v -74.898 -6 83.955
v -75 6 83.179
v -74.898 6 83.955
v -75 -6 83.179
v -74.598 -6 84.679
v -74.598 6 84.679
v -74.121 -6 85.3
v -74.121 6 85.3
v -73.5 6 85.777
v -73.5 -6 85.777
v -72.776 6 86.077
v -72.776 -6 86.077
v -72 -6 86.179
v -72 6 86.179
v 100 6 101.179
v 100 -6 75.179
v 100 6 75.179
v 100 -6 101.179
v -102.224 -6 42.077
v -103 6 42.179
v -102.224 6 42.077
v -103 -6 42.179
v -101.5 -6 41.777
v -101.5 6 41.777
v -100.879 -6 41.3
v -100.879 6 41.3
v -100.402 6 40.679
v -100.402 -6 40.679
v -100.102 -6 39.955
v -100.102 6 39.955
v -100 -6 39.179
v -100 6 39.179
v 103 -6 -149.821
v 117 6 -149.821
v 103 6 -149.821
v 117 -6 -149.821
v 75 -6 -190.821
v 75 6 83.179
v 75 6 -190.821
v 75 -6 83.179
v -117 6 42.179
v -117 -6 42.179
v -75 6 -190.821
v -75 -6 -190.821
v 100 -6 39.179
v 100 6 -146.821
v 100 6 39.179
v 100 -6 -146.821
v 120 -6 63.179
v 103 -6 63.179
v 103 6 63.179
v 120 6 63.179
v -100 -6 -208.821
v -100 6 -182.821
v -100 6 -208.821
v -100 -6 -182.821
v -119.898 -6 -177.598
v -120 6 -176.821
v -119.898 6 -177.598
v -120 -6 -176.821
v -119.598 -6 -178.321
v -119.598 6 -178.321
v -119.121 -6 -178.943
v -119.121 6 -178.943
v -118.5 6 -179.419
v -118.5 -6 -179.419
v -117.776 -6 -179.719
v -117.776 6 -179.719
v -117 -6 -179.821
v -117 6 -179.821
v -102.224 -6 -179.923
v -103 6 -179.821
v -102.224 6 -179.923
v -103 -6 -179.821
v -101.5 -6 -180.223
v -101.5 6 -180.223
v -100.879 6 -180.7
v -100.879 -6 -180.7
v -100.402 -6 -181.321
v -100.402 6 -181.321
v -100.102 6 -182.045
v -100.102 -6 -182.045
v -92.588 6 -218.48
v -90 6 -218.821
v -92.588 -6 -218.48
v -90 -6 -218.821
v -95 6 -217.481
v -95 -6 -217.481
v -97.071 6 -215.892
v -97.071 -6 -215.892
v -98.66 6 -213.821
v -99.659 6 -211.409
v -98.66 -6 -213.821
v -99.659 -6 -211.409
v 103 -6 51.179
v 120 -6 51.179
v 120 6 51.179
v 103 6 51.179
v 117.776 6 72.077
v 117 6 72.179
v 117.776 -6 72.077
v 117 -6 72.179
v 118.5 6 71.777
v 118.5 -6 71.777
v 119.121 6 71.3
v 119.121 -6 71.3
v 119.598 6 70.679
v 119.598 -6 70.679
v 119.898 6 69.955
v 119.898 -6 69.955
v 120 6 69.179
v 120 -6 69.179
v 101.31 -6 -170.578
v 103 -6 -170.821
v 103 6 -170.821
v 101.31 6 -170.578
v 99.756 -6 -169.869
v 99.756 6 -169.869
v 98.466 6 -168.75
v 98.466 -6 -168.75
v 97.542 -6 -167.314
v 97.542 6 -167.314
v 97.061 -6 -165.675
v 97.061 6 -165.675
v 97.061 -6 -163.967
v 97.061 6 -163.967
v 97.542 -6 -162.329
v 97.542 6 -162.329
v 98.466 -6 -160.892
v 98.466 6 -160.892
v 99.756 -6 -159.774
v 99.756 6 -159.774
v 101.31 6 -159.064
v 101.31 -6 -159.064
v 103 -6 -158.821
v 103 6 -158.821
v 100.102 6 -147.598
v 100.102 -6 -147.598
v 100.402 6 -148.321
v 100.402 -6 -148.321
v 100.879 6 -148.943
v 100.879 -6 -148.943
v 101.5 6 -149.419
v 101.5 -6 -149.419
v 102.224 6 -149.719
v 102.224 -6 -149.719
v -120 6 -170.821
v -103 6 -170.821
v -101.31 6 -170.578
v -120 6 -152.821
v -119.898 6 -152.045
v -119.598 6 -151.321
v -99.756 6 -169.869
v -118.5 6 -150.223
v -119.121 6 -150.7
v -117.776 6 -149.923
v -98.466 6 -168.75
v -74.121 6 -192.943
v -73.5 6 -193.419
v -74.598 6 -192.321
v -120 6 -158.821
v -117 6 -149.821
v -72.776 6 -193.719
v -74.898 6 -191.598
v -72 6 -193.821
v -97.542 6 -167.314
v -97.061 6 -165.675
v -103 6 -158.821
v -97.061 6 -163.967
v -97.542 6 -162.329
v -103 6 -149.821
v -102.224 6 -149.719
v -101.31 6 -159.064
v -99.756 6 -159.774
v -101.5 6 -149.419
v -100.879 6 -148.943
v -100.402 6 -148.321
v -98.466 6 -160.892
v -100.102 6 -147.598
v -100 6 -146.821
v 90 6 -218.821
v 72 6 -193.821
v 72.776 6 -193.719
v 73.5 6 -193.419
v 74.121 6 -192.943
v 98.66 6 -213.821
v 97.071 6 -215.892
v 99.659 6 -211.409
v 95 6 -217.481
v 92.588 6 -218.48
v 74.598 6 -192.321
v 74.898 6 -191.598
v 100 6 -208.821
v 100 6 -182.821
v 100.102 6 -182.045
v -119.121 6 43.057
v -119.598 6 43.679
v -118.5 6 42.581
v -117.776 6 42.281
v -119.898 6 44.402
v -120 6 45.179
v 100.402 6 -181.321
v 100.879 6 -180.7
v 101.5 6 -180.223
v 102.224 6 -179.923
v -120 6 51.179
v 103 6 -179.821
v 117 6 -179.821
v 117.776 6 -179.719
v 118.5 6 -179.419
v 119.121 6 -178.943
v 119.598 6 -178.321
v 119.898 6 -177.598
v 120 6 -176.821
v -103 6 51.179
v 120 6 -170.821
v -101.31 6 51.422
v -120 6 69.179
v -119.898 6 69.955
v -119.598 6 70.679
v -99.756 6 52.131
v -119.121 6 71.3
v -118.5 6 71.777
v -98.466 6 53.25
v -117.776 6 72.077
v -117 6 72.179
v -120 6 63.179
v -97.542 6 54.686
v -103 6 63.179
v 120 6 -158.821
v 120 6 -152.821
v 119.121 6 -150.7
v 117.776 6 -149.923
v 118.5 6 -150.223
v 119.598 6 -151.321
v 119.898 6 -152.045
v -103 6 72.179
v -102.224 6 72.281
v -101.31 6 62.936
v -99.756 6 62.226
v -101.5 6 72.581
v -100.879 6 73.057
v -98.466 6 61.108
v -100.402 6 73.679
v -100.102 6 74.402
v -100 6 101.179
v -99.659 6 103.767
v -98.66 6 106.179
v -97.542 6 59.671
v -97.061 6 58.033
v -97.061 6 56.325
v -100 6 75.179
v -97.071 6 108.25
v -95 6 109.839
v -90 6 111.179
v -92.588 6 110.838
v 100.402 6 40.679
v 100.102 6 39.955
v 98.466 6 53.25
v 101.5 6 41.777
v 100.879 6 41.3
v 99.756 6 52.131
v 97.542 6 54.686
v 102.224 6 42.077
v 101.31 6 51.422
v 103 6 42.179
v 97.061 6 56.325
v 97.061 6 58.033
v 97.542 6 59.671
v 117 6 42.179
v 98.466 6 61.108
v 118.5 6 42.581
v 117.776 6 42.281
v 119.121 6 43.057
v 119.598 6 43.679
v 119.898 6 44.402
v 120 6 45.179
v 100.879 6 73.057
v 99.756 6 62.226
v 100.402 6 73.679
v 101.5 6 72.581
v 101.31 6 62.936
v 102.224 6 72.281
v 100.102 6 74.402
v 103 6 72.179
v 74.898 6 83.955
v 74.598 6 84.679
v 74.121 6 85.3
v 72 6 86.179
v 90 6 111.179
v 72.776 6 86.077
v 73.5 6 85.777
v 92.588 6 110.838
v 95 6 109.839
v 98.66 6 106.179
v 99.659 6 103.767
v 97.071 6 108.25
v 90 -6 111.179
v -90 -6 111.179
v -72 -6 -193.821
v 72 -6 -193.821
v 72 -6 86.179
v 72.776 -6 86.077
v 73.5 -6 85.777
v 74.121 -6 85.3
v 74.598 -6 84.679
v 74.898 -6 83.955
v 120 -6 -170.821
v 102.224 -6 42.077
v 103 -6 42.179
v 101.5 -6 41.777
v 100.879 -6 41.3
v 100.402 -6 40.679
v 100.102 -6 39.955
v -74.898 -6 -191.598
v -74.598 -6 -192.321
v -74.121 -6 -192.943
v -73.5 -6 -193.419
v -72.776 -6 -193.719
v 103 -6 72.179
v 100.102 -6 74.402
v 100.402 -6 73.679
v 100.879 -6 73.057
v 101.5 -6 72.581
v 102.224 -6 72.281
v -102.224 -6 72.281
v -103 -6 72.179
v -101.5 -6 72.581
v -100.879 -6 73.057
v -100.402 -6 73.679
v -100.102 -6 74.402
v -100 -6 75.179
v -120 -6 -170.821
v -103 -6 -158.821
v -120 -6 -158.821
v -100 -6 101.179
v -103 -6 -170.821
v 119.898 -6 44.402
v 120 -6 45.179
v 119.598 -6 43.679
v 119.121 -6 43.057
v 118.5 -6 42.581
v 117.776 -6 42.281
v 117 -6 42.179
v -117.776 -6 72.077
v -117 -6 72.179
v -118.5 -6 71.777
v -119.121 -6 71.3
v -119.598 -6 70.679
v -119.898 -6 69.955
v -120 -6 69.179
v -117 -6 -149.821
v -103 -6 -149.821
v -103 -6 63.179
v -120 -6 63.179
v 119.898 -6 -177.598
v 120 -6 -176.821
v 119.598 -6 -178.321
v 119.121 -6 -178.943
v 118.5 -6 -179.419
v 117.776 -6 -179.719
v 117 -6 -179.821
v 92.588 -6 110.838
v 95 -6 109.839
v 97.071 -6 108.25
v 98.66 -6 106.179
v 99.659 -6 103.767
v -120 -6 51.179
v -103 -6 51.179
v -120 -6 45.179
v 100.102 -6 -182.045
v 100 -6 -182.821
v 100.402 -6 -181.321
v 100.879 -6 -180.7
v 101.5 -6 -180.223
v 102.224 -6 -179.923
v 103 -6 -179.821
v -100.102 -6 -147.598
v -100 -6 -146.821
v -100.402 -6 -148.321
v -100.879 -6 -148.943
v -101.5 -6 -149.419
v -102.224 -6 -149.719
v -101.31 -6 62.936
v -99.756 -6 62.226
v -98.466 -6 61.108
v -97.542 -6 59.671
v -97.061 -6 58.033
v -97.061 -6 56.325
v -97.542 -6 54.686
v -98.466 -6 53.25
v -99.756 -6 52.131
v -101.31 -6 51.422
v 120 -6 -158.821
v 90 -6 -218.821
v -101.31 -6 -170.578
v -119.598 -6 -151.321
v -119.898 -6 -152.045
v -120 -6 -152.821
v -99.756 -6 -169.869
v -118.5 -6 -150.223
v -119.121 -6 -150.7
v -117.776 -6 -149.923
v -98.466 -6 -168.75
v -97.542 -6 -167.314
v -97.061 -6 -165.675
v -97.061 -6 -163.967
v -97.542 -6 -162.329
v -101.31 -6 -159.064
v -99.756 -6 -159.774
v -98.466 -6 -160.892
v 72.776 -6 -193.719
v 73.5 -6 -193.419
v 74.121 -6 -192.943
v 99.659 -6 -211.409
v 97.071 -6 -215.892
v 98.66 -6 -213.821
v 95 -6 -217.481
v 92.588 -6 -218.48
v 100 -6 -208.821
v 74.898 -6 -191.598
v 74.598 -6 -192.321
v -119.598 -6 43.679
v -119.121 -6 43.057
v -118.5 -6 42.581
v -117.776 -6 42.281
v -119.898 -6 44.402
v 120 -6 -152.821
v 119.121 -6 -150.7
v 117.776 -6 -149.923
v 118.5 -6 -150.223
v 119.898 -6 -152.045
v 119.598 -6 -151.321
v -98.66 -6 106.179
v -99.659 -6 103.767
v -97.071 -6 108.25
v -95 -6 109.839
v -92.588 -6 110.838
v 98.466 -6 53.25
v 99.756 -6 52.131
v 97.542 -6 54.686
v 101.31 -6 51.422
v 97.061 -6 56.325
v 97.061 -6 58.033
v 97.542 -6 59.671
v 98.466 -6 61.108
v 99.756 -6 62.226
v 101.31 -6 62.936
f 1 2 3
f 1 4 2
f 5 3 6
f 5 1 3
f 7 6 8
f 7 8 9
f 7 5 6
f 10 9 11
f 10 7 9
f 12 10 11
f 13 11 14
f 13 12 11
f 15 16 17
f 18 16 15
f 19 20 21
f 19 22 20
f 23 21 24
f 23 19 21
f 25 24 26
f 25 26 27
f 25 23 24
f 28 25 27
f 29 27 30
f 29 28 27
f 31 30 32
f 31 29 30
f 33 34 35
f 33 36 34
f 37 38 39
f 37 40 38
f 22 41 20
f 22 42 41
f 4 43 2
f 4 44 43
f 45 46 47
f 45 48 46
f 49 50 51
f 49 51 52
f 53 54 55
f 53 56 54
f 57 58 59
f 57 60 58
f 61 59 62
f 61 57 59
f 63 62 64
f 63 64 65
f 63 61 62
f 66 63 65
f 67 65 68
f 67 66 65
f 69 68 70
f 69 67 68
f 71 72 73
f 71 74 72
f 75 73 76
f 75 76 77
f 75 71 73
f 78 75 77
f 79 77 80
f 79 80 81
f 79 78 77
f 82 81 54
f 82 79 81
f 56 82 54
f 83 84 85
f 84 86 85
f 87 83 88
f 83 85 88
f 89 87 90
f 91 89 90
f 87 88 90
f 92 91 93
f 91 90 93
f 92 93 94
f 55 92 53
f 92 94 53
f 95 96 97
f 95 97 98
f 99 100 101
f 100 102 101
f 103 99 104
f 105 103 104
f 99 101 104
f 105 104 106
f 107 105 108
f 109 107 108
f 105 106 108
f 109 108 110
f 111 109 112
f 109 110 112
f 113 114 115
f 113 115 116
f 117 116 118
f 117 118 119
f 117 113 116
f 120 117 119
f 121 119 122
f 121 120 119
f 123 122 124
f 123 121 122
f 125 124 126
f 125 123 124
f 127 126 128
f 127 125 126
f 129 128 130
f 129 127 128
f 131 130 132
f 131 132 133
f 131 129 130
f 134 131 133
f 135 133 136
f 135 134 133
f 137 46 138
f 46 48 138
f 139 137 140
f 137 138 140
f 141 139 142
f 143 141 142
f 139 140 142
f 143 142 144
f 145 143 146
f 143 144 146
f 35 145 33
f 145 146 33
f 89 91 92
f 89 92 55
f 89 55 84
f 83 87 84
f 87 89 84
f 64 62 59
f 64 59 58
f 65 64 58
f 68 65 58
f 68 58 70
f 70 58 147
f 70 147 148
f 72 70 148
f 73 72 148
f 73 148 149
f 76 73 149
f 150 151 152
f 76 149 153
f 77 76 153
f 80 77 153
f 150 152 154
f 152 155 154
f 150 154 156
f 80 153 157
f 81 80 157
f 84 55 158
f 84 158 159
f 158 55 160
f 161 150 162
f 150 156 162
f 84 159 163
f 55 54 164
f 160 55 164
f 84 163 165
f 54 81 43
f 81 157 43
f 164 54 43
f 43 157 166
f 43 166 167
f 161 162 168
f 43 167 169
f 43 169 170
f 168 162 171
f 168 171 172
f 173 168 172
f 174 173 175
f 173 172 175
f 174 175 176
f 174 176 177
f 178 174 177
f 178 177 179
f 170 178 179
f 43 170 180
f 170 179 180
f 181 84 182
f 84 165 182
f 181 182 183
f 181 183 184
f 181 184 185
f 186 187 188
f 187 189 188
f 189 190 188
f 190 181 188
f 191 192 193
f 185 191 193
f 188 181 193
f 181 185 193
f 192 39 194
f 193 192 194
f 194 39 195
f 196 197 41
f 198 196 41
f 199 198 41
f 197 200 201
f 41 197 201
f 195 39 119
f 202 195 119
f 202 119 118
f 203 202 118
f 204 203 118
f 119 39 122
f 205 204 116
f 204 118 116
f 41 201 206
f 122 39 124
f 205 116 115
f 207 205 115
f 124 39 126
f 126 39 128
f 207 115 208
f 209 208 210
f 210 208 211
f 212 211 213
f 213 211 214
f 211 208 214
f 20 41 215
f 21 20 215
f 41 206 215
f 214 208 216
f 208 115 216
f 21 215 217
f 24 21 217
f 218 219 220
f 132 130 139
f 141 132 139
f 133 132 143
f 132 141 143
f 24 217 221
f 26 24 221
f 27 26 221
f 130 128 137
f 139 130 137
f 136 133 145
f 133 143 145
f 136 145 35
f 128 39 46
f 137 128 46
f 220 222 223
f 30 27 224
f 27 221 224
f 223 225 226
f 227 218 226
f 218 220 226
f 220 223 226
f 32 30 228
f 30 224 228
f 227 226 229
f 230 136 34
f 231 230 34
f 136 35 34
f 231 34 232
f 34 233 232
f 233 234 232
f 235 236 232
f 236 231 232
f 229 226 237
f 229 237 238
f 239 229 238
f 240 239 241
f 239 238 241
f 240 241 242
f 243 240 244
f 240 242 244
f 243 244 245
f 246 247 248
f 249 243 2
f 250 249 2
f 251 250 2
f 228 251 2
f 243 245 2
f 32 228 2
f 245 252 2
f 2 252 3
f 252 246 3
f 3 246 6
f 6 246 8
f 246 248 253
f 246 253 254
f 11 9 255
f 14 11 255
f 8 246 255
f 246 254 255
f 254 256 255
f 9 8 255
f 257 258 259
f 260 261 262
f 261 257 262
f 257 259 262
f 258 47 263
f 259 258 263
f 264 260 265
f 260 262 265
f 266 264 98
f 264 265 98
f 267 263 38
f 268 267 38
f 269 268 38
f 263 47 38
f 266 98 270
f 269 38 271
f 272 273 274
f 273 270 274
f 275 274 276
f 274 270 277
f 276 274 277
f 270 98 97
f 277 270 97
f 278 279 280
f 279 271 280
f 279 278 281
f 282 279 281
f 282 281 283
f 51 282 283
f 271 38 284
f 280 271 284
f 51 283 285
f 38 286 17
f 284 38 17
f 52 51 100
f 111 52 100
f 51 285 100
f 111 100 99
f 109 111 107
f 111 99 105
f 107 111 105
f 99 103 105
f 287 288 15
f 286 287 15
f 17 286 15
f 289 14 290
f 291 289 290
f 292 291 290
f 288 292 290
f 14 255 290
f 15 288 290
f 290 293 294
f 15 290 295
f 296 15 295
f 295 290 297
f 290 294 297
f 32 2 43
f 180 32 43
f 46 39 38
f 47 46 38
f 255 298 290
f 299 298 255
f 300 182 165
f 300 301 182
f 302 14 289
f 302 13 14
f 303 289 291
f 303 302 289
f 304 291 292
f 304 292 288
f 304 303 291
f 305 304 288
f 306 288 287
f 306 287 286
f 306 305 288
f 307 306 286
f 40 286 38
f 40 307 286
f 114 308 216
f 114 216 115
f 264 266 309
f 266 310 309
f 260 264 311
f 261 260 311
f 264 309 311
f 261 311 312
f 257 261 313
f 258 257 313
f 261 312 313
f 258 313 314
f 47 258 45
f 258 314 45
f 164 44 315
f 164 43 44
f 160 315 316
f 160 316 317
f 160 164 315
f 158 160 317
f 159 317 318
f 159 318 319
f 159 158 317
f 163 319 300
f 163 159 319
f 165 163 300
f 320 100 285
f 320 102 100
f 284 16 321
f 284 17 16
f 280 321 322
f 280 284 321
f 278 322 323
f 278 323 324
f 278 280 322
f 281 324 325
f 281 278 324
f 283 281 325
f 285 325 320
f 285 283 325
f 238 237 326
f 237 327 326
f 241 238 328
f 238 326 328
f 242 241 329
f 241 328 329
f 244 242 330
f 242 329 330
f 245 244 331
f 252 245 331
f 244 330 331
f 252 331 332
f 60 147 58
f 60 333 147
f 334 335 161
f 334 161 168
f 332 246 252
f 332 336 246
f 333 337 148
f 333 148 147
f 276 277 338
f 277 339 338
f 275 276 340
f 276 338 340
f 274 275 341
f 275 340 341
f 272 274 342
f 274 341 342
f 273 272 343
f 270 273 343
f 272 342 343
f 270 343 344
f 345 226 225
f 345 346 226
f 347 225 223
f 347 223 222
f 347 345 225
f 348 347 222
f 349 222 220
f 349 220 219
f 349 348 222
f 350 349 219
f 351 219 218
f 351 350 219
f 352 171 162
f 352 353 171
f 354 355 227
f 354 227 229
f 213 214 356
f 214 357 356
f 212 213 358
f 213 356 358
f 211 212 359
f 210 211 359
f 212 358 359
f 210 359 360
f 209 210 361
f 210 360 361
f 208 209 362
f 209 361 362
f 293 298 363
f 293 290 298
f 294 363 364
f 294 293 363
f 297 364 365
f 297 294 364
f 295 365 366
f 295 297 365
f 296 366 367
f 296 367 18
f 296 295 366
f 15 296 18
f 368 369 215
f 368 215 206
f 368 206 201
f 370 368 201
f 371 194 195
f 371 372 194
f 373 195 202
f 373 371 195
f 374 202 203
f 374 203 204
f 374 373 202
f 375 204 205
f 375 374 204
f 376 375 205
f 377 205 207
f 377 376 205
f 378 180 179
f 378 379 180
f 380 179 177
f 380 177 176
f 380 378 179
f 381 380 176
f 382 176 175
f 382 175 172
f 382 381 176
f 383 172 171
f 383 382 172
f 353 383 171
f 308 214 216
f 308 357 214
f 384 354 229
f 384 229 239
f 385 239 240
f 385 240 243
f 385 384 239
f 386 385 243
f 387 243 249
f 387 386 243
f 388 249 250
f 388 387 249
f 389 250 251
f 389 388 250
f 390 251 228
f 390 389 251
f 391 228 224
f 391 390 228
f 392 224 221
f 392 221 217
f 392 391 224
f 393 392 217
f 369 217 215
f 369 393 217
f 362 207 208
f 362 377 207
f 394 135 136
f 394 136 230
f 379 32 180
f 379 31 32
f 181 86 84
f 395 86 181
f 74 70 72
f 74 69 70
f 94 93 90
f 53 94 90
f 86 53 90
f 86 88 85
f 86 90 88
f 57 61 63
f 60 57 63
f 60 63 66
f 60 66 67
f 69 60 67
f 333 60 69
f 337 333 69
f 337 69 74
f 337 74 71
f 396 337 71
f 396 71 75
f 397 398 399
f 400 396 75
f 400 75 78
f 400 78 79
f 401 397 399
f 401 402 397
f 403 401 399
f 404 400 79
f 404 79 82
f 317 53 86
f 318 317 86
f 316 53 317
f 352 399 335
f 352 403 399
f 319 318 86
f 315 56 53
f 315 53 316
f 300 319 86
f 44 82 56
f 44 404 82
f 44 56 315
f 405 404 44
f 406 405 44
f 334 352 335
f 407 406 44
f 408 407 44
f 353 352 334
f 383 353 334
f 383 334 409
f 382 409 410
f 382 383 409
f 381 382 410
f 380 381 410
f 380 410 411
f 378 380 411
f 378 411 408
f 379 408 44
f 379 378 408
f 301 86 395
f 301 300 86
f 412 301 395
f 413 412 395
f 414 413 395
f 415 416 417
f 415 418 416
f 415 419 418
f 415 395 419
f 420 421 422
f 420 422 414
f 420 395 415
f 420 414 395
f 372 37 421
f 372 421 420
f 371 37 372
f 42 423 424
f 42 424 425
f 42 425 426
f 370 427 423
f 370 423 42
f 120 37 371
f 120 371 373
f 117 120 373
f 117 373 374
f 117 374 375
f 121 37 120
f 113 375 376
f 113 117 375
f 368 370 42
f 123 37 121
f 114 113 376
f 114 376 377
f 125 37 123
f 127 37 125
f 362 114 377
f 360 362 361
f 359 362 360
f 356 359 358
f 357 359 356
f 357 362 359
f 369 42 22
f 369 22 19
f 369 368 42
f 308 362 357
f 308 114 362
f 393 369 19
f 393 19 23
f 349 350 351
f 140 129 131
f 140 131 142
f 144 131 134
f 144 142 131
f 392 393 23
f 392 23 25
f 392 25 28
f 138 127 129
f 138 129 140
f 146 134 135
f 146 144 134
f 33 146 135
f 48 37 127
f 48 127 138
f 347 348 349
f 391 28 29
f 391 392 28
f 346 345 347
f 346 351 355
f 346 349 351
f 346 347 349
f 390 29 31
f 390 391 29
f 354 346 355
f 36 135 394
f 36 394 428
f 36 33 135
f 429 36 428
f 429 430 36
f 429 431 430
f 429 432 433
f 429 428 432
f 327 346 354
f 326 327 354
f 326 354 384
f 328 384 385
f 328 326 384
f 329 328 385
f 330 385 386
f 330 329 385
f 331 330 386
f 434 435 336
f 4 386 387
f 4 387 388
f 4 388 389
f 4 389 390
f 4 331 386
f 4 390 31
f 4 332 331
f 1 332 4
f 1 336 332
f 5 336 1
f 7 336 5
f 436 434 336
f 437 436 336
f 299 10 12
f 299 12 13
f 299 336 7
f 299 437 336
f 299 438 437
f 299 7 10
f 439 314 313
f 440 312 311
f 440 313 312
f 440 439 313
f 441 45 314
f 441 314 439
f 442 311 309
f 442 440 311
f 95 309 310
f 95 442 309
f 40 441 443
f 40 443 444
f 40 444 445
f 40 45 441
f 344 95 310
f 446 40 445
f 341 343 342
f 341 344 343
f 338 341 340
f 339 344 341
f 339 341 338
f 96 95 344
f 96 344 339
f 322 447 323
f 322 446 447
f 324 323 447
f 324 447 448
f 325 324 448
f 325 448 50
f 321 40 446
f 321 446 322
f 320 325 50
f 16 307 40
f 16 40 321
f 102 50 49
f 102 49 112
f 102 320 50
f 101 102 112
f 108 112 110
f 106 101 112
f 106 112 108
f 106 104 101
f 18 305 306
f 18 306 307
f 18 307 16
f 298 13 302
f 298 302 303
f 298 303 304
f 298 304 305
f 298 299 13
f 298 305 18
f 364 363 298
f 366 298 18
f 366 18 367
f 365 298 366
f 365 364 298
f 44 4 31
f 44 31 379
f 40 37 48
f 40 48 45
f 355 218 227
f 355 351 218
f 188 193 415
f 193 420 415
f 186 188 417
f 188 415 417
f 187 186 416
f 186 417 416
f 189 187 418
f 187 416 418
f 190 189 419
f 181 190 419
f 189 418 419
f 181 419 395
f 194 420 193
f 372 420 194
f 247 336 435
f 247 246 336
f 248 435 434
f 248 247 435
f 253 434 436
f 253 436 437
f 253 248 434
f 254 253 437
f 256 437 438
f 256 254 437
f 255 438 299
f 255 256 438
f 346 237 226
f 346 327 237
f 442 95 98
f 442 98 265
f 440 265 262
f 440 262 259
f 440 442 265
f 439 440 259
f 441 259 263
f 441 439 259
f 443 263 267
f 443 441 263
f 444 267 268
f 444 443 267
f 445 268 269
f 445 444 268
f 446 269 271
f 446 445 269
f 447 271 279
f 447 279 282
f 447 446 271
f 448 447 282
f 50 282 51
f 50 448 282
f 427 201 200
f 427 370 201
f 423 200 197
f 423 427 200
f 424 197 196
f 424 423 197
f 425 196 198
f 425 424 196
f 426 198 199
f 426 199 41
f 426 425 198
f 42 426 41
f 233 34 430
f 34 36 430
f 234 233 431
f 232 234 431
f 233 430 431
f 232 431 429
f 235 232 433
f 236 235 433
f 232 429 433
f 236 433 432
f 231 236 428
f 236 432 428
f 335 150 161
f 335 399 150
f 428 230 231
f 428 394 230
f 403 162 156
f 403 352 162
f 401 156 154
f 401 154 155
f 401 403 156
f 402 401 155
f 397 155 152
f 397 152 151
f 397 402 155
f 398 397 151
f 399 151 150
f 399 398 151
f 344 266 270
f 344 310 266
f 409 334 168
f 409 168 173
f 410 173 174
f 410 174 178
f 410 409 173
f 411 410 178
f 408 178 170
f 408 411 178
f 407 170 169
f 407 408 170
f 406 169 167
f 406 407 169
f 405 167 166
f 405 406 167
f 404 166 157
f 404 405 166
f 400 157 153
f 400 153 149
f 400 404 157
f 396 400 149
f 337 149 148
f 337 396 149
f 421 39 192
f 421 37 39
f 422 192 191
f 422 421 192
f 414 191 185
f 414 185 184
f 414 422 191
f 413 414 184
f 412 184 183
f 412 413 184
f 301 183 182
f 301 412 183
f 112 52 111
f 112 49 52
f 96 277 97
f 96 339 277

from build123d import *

# Parameters (mm, degrees)
F1_DEPTH = 6
F2_R     = 10
F3_R     = 3
F4_R     = 3
F5_R     = 3


with BuildPart() as f1:
    # F0 (on Front) → F1 (new body, symmetric)
    with BuildSketch(Plane.XZ):
        with BuildLine():
            Line((0, 111.17877506), (-100, 111.17877506))
            Line((-100, 111.17877506), (-100, 72.17877506))
            Line((-100, 72.17877506), (-120, 72.17877506))
            Line((-120, 72.17877506), (-120, 63.17877506))
            Line((-120, 63.17877506), (-103, 63.17877506))
            ThreePointArc((-103, 63.17877506), (-97, 57.17877506), (-103, 51.17877506))
            Line((-103, 51.17877506), (-120, 51.17877506))
            Line((-120, 51.17877506), (-120, 42.17877506))
            Line((-120, 42.17877506), (-100, 42.17877506))
            Line((-100, 42.17877506), (-100, -53.82122494))
            Line((-100, -53.82122494), (-100, -149.82122494))
            Line((-100, -149.82122494), (-120, -149.82122494))
            Line((-120, -149.82122494), (-120, -158.82122494))
            Line((-120, -158.82122494), (-103, -158.82122494))
            ThreePointArc((-103, -158.82122494), (-97, -164.82122494), (-103, -170.82122494))
            Line((-103, -170.82122494), (-120, -170.82122494))
            Line((-120, -170.82122494), (-120, -179.82122494))
            Line((-120, -179.82122494), (-100, -179.82122494))
            Line((-100, -179.82122494), (-100, -218.82122494))
            Line((-100, -218.82122494), (0, -218.82122494))
            Line((0, -218.82122494), (100, -218.82122494))
            Line((100, -218.82122494), (100, -179.82122494))
            Line((100, -179.82122494), (120, -179.82122494))
            Line((120, -179.82122494), (120, -170.82122494))
            Line((120, -170.82122494), (103, -170.82122494))
            ThreePointArc((103, -170.82122494), (97, -164.82122494), (103, -158.82122494))
            Line((103, -158.82122494), (120, -158.82122494))
            Line((120, -158.82122494), (120, -149.82122494))
            Line((120, -149.82122494), (100, -149.82122494))
            Line((100, -149.82122494), (100, -53.82122494))
            Line((100, -53.82122494), (100, 42.17877506))
            Line((100, 42.17877506), (120, 42.17877506))
            Line((120, 42.17877506), (120, 51.17877506))
            Line((120, 51.17877506), (103, 51.17877506))
            ThreePointArc((103, 51.17877506), (97, 57.17877506), (103, 63.17877506))
            Line((103, 63.17877506), (120, 63.17877506))
            Line((120, 63.17877506), (120, 72.17877506))
            Line((120, 72.17877506), (100, 72.17877506))
            Line((100, 72.17877506), (100, 111.17877506))
            Line((100, 111.17877506), (0, 111.17877506))
        make_face()
        Polygon((-75, -53.82122494), (-75, 86.17877506), (0, 86.17877506), (75, 86.17877506), (75, -53.82122494), (75, -193.82122494), (0, -193.82122494), (-75, -193.82122494), align=None, mode=Mode.SUBTRACT)
    extrude(amount=F1_DEPTH, both=True)

    # F2
    f2_edges = [f1.edges().sort_by_distance(p)[0] for p in [
        (100, 0, 111.178775),
        (-100, 0, 111.178775),
        (100, 0, -218.821225),
        (-100, 0, -218.821225),
    ]]
    fillet(f2_edges, radius=F2_R)

    # F3
    f3_edges = [f1.edges().sort_by_distance(p)[0] for p in [
        (-75, 0, -193.821225),
        (75, 0, -193.821225),
        (75, 0, 86.178775),
        (-75, 0, 86.178775),
    ]]
    fillet(f3_edges, radius=F3_R)

    # F4
    f4_edges = [f1.edges().sort_by_distance(p)[0] for p in [
        (-120, 0, -149.821225),
        (-120, 0, -179.821225),
        (120, 0, -149.821225),
        (120, 0, -179.821225),
        (120, 0, 72.178775),
        (120, 0, 42.178775),
        (-120, 0, 72.178775),
        (-120, 0, 42.178775),
    ]]
    fillet(f4_edges, radius=F4_R)

    # F5
    f5_edges = [f1.edges().sort_by_distance(p)[0] for p in [
        (100, 0, 72.178775),
        (100, 0, 42.178775),
        (100, 0, -179.821225),
        (100, 0, -149.821225),
        (-100, 0, -149.821225),
        (-100, 0, -179.821225),
        (-100, 0, 72.178775),
        (-100, 0, 42.178775),
    ]]
    fillet(f5_edges, radius=F5_R)


solid = f1.part
